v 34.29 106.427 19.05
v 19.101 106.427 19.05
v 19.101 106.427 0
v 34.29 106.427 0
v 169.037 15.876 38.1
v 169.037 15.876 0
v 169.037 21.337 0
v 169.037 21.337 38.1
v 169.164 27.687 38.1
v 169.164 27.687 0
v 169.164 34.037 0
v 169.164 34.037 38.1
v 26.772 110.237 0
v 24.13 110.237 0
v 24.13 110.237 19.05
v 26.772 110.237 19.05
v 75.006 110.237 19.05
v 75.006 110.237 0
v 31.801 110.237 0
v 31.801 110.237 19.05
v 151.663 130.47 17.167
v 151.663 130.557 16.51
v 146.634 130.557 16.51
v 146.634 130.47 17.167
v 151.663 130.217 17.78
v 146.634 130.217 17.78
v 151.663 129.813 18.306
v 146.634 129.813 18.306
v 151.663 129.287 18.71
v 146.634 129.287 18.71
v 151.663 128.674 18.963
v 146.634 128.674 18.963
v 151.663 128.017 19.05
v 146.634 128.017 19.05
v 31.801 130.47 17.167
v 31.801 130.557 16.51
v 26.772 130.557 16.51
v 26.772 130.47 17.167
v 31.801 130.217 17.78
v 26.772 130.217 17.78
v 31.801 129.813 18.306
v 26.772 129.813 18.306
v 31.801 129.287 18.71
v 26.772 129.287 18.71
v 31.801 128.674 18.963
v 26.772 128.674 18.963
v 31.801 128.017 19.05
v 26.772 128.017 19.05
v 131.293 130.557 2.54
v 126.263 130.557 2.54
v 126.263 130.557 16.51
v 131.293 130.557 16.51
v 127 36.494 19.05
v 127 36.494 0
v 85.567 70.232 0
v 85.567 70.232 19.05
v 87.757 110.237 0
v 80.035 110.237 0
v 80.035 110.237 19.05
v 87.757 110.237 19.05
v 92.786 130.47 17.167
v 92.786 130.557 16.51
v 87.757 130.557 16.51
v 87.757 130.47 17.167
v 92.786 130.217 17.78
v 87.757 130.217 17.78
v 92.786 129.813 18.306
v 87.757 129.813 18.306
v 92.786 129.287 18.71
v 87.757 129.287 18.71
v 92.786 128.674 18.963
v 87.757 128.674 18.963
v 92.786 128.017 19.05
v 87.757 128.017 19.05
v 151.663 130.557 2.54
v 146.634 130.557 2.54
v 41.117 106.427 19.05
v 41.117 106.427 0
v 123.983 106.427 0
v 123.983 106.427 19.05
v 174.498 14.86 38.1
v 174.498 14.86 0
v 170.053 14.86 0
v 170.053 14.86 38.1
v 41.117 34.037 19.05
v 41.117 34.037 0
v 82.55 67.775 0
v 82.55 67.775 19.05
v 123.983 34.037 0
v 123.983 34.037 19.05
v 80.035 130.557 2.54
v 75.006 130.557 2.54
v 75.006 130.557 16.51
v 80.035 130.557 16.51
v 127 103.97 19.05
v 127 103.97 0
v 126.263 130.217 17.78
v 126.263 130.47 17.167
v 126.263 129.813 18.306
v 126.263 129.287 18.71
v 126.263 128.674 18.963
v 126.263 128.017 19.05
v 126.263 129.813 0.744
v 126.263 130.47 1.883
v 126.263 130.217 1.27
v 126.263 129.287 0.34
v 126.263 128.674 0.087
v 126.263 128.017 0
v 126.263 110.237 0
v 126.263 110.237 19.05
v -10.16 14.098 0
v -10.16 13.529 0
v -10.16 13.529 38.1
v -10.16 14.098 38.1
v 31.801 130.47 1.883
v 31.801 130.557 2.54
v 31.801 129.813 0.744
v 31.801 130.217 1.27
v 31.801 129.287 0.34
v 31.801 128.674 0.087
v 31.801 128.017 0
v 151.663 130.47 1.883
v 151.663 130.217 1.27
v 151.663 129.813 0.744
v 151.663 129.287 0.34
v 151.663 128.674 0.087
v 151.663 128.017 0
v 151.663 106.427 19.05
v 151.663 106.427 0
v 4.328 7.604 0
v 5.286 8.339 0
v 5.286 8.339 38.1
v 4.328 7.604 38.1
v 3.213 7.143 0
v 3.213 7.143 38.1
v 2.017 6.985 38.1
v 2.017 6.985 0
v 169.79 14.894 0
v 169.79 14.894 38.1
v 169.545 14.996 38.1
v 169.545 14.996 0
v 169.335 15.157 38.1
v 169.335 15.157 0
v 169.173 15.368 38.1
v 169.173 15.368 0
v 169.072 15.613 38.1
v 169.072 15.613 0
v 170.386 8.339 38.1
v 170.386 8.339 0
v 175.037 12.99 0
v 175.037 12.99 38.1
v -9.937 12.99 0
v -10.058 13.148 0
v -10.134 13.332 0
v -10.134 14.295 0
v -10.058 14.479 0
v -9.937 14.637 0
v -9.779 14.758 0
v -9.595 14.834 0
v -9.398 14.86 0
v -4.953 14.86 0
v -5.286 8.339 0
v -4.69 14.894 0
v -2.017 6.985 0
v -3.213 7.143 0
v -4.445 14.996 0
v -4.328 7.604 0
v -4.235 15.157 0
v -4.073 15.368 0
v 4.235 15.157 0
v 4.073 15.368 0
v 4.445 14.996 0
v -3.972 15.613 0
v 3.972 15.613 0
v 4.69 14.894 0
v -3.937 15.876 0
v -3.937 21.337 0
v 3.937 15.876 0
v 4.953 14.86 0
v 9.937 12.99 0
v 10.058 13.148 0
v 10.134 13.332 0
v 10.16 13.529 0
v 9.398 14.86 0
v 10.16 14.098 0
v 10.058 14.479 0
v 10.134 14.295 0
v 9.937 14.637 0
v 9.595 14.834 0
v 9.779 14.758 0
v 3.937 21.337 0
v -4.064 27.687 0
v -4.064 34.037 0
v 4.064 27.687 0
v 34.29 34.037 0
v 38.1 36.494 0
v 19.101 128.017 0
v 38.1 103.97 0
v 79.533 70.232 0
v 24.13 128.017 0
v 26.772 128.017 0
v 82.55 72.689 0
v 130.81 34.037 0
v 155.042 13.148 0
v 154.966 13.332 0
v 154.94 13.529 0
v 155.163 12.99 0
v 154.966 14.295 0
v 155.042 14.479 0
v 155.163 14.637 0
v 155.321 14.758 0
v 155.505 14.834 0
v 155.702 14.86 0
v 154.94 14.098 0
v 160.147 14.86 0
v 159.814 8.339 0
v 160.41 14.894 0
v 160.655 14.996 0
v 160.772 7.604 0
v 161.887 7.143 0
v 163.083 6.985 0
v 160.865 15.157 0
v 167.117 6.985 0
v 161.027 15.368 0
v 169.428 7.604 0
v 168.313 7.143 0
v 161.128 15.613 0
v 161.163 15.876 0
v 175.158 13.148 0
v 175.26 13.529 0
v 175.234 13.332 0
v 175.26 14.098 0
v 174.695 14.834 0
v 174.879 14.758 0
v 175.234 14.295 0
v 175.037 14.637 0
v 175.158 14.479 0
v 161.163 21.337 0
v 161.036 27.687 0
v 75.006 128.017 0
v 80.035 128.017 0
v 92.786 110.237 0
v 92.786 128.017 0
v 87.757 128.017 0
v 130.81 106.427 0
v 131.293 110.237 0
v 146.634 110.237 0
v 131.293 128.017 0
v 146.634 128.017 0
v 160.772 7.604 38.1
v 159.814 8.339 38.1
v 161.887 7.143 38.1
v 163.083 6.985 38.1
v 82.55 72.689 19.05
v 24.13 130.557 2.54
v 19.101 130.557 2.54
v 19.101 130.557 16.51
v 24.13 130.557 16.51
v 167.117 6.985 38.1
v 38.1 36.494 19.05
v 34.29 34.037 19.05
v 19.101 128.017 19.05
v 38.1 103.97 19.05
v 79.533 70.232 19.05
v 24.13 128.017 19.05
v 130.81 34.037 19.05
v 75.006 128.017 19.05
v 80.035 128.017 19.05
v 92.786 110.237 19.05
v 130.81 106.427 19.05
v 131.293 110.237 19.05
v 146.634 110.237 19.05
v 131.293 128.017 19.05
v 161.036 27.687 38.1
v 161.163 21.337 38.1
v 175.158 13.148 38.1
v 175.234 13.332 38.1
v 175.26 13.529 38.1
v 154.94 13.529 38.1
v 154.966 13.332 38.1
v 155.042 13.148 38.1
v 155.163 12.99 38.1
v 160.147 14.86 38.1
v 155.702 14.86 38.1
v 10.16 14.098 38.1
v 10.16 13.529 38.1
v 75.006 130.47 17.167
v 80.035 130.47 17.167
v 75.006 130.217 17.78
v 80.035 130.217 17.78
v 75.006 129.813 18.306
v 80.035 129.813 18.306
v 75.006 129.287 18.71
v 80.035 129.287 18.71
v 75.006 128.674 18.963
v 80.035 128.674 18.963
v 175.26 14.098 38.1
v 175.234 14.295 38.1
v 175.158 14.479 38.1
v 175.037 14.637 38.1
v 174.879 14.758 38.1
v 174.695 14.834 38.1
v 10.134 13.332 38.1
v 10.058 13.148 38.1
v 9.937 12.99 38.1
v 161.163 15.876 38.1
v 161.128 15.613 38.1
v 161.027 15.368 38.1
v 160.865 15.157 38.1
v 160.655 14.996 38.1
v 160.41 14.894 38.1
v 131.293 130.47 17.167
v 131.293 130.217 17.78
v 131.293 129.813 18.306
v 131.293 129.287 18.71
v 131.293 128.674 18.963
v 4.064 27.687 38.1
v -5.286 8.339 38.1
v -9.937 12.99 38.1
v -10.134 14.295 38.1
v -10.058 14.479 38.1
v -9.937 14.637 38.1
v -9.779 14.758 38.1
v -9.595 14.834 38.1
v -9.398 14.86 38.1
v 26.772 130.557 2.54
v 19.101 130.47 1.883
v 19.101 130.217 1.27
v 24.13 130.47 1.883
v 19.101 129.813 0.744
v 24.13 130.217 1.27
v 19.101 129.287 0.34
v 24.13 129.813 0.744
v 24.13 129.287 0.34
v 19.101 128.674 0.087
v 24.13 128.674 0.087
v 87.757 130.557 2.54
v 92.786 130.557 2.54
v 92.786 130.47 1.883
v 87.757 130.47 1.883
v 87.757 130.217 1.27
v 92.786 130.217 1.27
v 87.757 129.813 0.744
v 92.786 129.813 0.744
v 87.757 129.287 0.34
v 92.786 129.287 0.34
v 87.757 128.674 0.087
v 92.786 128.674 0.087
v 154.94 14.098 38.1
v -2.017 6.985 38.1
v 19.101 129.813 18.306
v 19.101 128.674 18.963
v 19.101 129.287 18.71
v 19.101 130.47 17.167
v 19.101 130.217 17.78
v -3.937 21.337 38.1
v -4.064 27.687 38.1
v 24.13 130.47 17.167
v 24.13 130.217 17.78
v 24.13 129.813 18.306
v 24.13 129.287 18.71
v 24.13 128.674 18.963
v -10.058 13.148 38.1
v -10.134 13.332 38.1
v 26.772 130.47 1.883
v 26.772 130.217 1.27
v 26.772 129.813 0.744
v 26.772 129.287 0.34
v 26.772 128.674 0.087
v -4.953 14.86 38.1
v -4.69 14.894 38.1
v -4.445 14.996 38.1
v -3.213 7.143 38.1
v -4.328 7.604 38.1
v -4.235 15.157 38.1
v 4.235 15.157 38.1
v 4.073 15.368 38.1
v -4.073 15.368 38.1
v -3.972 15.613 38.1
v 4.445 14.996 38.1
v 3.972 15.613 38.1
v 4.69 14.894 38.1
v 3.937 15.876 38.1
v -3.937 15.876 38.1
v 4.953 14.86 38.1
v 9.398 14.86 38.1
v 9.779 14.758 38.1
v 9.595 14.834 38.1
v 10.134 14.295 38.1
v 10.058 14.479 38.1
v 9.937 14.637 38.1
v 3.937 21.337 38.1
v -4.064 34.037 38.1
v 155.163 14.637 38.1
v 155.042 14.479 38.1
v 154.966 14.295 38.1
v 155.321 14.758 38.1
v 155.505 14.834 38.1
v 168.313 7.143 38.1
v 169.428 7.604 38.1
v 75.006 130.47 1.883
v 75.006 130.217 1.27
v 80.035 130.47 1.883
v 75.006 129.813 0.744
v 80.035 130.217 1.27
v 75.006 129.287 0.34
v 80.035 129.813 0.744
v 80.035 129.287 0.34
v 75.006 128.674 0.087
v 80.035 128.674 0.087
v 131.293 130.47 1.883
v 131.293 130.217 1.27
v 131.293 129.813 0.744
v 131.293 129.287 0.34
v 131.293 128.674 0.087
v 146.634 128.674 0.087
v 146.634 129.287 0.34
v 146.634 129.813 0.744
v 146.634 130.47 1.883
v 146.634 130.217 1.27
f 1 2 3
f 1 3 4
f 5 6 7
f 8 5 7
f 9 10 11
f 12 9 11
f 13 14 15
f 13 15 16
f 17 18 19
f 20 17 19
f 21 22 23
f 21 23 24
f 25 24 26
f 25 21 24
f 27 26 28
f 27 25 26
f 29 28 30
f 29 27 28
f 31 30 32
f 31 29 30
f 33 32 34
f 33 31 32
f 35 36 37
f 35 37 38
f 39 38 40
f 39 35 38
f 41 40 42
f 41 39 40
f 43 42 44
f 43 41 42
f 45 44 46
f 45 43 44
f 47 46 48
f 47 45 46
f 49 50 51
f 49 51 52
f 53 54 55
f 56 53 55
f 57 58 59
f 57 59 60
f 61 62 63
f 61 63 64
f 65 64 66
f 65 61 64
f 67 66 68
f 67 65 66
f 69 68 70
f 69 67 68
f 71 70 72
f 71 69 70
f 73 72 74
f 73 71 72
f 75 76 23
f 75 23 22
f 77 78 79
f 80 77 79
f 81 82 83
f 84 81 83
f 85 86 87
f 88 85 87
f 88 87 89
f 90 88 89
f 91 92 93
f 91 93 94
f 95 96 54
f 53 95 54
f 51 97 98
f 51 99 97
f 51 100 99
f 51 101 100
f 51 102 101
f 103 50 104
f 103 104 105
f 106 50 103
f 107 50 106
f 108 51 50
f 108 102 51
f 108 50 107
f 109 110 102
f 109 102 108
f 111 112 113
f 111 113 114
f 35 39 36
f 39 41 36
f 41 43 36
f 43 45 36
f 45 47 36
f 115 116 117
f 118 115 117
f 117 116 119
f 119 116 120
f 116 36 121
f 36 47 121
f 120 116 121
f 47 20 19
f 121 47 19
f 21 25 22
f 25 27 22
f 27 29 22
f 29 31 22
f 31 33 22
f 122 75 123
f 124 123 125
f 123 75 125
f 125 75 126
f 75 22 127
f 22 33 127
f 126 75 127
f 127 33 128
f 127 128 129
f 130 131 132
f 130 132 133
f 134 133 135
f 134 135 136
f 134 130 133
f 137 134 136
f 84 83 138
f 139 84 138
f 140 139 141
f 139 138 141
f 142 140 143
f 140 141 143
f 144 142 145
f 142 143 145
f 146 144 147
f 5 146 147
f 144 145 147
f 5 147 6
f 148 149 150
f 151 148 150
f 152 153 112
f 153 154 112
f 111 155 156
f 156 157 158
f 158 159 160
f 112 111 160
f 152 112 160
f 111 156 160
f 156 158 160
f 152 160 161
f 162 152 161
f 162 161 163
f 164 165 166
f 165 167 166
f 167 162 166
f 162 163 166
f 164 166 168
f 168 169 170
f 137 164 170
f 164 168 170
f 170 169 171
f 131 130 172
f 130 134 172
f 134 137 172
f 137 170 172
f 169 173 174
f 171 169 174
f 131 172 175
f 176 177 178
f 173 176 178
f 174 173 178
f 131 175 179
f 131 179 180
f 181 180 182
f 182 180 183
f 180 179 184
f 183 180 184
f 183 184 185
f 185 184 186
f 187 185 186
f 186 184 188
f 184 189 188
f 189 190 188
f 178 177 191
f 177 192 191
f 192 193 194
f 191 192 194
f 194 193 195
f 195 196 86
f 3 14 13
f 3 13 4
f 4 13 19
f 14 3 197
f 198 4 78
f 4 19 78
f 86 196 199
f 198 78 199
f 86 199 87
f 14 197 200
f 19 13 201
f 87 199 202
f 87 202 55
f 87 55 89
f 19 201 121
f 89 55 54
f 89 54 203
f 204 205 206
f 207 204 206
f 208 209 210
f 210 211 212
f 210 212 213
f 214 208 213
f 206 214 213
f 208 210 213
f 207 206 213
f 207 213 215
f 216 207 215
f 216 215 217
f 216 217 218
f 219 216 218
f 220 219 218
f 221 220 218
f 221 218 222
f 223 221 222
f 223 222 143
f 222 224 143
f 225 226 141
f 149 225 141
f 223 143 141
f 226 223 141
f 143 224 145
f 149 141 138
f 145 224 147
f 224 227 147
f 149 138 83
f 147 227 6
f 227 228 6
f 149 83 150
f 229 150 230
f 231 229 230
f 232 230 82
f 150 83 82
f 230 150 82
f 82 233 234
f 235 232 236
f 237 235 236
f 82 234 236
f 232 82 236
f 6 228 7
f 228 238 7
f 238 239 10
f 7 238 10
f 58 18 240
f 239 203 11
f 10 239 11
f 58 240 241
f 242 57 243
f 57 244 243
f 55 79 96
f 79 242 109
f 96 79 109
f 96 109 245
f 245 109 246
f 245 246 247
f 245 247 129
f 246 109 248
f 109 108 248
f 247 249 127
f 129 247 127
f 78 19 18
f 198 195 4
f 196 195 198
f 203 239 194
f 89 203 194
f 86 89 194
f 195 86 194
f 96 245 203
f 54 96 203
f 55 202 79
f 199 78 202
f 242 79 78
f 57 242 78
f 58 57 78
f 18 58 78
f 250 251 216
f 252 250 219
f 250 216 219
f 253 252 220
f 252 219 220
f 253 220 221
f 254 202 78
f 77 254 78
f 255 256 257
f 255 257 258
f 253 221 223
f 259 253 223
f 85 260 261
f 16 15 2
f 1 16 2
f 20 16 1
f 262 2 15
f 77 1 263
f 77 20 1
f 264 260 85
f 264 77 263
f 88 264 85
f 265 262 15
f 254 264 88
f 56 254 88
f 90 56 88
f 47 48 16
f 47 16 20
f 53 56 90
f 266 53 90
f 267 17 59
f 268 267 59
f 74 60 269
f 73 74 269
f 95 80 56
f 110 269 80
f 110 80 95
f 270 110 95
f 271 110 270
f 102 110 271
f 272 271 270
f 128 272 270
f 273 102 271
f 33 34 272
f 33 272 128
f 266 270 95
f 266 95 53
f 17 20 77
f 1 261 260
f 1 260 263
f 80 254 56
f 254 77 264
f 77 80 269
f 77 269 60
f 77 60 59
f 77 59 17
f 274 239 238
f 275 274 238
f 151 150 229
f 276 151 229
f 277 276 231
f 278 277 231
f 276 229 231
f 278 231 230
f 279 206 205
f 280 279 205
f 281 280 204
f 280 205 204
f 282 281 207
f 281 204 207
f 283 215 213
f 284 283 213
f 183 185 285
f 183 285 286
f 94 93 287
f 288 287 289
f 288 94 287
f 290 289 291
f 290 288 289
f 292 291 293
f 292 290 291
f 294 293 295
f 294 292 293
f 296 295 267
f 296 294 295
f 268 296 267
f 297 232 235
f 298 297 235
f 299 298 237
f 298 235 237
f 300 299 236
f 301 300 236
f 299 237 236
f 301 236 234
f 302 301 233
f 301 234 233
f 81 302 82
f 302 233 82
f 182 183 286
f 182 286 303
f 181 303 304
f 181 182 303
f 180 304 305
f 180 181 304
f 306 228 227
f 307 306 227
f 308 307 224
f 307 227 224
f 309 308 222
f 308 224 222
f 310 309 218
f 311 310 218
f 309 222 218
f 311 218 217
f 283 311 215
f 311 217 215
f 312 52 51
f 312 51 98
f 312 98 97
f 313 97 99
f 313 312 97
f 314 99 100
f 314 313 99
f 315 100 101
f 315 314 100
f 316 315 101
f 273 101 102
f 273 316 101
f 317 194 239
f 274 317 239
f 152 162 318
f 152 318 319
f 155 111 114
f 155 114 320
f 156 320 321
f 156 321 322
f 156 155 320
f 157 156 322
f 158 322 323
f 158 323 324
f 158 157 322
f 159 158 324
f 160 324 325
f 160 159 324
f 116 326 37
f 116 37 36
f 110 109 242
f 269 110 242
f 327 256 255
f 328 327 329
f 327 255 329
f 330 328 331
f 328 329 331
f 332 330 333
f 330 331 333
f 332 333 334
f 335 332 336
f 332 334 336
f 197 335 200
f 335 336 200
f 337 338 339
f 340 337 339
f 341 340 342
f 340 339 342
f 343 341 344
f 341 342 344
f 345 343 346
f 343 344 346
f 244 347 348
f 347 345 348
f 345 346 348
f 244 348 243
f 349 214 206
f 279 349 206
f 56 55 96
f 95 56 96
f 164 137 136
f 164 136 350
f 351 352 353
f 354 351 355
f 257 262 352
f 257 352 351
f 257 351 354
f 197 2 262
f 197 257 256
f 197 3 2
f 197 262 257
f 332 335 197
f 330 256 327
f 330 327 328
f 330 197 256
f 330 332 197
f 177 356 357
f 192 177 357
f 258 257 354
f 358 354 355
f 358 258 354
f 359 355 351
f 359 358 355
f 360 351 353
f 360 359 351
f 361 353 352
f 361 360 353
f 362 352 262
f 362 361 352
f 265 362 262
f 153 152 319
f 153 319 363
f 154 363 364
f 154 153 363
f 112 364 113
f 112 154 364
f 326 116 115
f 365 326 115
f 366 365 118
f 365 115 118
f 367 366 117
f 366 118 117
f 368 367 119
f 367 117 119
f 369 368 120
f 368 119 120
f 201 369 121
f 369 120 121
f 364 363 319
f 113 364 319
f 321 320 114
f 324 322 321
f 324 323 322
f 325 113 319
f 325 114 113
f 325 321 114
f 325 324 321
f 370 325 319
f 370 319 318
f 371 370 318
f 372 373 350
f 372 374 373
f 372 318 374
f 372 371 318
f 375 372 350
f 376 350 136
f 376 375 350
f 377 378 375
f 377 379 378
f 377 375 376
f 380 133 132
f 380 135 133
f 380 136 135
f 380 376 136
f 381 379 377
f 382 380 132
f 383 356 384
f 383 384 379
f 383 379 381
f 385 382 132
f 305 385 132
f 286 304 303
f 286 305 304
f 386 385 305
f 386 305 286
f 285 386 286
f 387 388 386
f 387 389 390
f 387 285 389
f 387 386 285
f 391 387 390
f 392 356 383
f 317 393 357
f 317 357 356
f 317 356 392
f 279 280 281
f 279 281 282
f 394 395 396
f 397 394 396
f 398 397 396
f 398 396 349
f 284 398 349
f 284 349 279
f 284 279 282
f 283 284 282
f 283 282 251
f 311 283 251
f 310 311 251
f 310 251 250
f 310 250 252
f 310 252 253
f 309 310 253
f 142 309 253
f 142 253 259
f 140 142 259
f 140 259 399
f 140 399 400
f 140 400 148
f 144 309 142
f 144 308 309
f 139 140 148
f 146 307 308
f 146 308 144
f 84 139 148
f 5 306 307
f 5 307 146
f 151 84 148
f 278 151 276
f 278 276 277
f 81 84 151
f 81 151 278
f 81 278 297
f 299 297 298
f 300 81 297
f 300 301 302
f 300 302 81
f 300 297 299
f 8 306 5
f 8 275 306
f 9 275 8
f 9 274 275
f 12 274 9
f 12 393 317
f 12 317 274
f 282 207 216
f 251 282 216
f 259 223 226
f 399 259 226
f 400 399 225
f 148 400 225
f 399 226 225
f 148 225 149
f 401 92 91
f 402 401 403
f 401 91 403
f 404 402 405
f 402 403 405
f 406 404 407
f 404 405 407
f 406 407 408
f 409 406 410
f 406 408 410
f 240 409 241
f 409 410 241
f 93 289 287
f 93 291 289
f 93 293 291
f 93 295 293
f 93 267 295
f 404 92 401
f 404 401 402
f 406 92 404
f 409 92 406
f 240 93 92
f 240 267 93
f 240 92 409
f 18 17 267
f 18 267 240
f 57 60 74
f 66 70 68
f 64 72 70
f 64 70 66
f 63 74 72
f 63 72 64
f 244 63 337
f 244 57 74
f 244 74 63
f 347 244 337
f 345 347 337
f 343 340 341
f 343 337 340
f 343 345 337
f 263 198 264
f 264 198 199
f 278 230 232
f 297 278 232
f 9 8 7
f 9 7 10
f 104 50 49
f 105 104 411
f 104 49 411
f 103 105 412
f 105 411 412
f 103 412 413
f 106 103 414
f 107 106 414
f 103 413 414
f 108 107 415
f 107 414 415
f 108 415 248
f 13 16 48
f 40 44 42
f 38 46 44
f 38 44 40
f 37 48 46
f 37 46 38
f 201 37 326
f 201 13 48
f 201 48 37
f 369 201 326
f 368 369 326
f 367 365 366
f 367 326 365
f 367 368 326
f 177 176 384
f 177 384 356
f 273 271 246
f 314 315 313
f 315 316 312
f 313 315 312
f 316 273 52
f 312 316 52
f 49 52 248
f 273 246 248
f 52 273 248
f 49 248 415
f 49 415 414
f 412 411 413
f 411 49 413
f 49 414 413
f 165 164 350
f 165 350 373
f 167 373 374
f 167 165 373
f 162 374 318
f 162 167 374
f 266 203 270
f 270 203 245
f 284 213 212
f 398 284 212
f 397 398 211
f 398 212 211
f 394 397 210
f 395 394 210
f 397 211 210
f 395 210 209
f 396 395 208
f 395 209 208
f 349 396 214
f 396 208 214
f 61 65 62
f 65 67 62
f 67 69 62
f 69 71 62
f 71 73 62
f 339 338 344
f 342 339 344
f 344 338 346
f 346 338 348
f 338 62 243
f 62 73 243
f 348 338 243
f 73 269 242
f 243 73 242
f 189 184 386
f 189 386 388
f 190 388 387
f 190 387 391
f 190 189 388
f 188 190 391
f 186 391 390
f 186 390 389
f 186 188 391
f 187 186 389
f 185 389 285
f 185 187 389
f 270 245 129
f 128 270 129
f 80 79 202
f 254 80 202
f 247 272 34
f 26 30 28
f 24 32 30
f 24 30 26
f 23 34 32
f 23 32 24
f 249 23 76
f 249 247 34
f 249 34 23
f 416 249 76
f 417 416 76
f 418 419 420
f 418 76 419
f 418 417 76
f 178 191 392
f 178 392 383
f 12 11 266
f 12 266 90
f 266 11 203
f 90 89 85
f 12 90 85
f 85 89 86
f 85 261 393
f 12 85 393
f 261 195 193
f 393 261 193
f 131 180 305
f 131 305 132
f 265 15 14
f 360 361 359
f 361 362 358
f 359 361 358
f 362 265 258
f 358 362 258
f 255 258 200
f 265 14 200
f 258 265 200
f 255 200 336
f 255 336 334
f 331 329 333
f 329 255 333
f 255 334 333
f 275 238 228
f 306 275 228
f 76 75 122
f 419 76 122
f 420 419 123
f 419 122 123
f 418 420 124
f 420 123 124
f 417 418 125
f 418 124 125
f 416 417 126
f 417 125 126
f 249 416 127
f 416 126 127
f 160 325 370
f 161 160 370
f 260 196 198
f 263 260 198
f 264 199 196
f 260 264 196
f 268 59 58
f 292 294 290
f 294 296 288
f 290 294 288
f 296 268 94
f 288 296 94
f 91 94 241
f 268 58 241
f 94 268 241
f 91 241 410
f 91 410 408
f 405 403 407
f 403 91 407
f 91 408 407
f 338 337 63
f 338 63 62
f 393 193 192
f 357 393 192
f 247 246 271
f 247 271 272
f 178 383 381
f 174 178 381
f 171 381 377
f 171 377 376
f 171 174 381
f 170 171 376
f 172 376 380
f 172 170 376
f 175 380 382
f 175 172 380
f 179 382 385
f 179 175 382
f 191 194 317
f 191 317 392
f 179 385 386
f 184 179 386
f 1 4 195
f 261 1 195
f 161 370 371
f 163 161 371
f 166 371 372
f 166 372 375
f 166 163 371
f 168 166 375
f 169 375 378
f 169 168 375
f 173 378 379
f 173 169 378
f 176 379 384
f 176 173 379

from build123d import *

# Parameters (mm, degrees)
BOSS_EXTRUDE2_DEPTH  = 38.1
BOSS_EXTRUDE6_DEPTH  = 19.05
SKETCH6_W            = 5.08
SKETCH6_H            = 19.05
BOSS_EXTRUDE5_DEPTH  = 20.32
SKETCH10_W           = 23.1648
SKETCH10_H           = 3.81
SKETCH10_W_2         = 17.5006
CUT_EXTRUDE3_DEPTH   = 19.05
FILLET1_R            = 2.54
BOSS_EXTRUDE7_DEPTH  = 19.05
CLEARANCE_START      = -38.1
SKETCH3_W            = 2.6416
SKETCH3_H            = 20.32
SKETCH3_W_2          = 7.7216
SKETCH3_W_3          = 15.3416
CLEARANCE_TRIM_DEPTH = 38.1


with BuildPart() as part:
    # Sketch1 → Boss-Extrude2 (new body)
    with BuildSketch(Plane.XY):
        with BuildLine():
            Line((-2.016886463, 6.858), (2.016886463, 6.858))
            ThreePointArc((2.016886463, 6.858), (3.83455623, 7.219556996), (5.375502252, 8.249184211))
            Line((5.375502252, 8.249184211), (10.026617928, 12.900299887))
            ThreePointArc((10.026617928, 12.900299887), (10.219328904, 13.188712244), (10.287, 13.528917816))
            Line((10.287, 13.528917816), (10.287, 14.097877816))
            ThreePointArc((10.287, 14.097877816), (10.026617928, 14.726495744), (9.398, 14.986877816))
            Line((9.398, 14.986877816), (4.953, 14.986877816))
            ThreePointArc((4.953, 14.986877816), (4.324382072, 15.247259887), (4.064, 15.875877816))
            Line((4.064, 15.875877816), (4.064, 27.686877816))
            Line((4.064, 27.686877816), (161.036, 27.686877816))
            Line((161.036, 27.686877816), (161.036, 15.875877816))
            ThreePointArc((161.036, 15.875877816), (160.775617928, 15.247259887), (160.147, 14.986877816))
            Line((160.147, 14.986877816), (155.702, 14.986877816))
            ThreePointArc((155.702, 14.986877816), (155.073382072, 14.726495744), (154.813, 14.097877816))
            Line((154.813, 14.097877816), (154.813, 13.528917816))
            ThreePointArc((154.813, 13.528917816), (154.880671096, 13.188712244), (155.073382072, 12.900299887))
            Line((155.073382072, 12.900299887), (159.724497748, 8.249184211))
            ThreePointArc((159.724497748, 8.249184211), (161.26544377, 7.219556996), (163.083113537, 6.858))
            Line((163.083113537, 6.858), (167.116886463, 6.858))
            ThreePointArc((167.116886463, 6.858), (168.93455623, 7.219556996), (170.475502252, 8.249184211))
            Line((170.475502252, 8.249184211), (175.126617928, 12.900299887))
            ThreePointArc((175.126617928, 12.900299887), (175.319328904, 13.188712244), (175.387, 13.528917816))
            Line((175.387, 13.528917816), (175.387, 14.097877816))
            ThreePointArc((175.387, 14.097877816), (175.126617928, 14.726495744), (174.498, 14.986877816))
            Line((174.498, 14.986877816), (170.053, 14.986877816))
            ThreePointArc((170.053, 14.986877816), (169.424382072, 15.247259887), (169.164, 15.875877816))
            Line((169.164, 15.875877816), (169.164, 27.686877816))
            Line((169.164, 27.686877816), (169.164, 34.036877816))
            Line((169.164, 34.036877816), (-4.064, 34.036877816))
            Line((-4.064, 34.036877816), (-4.064, 27.686877816))
            Line((-4.064, 27.686877816), (-4.064, 15.875877816))
            ThreePointArc((-4.064, 15.875877816), (-4.324382072, 15.247259887), (-4.953, 14.986877816))
            Line((-4.953, 14.986877816), (-9.398, 14.986877816))
            ThreePointArc((-9.398, 14.986877816), (-10.026617928, 14.726495744), (-10.287, 14.097877816))
            Line((-10.287, 14.097877816), (-10.287, 13.528917816))
            ThreePointArc((-10.287, 13.528917816), (-10.219328904, 13.188712244), (-10.026617928, 12.900299887))
            Line((-10.026617928, 12.900299887), (-5.375502252, 8.249184211))
            ThreePointArc((-5.375502252, 8.249184211), (-3.83455623, 7.219556996), (-2.016886463, 6.858))
        make_face()
    extrude(amount=BOSS_EXTRUDE2_DEPTH)

    # Sketch7 → Boss-Extrude6 (add)
    with BuildSketch(Plane.XY):
        Polygon((130.81, 106.426877816), (169.164, 106.426877816), (169.164, 110.236877816), (-4.064, 110.236877816), (-4.064, 106.426877816), (34.29, 106.426877816), (34.29, 34.036877816), (38.1, 34.036877816), (38.1, 106.426877816), (127, 106.426877816), (127, 34.036877816), (130.81, 34.036877816), align=None)
    extrude(amount=BOSS_EXTRUDE6_DEPTH)

    # Sketch6 → Boss-Extrude5 (add)
    with BuildSketch(Plane(origin=(0, 110.236877816, 0), x_dir=(1, 0, 0), z_dir=(0, 1, 0))):
        with Locations((21.6408, -9.525)):
            Rectangle(SKETCH6_W, SKETCH6_H)
        with Locations((29.2608, -9.525)):
            Rectangle(SKETCH6_W, SKETCH6_H)
        with Locations((77.5462, -9.525)):
            Rectangle(SKETCH6_W, SKETCH6_H)
        with Locations((90.2462, -9.525)):
            Rectangle(SKETCH6_W, SKETCH6_H)
        with Locations((128.8034, -9.525)):
            Rectangle(SKETCH6_W, SKETCH6_H)
        with Locations((149.1234, -9.525)):
            Rectangle(SKETCH6_W, SKETCH6_H)
    extrude(amount=BOSS_EXTRUDE5_DEPTH)

    # Sketch10 → Cut-Extrude3 (cut)
    with BuildSketch(Plane.XY):
        with Locations((7.5184, 108.331877816)):
            Rectangle(SKETCH10_W, SKETCH10_H)
        with Locations((160.4137, 108.331877816)):
            Rectangle(SKETCH10_W_2, SKETCH10_H)
    extrude(amount=CUT_EXTRUDE3_DEPTH, mode=Mode.SUBTRACT)

    # Fillet1
    fillet1_edges = [part.edges().sort_by_distance(p)[0] for p in [
        (21.6408, 130.556877816, 19.05),
        (21.6408, 130.556877816, 0),
        (29.2608, 130.556877816, 0),
        (29.2608, 130.556877816, 19.05),
        (77.5462, 130.556877816, 0),
        (77.5462, 130.556877816, 19.05),
        (90.2462, 130.556877816, 0),
        (90.2462, 130.556877816, 19.05),
        (128.8034, 130.556877816, 0),
        (128.8034, 130.556877816, 19.05),
        (149.1234, 130.556877816, 0),
        (149.1234, 130.556877816, 19.05),
    ]]
    fillet(fillet1_edges, radius=FILLET1_R)

    # Sketch11 → Boss-Extrude7 (add)
    with BuildSketch(Plane.XY):
        Polygon((38.1, 103.970194938), (79.533021028, 70.231877816), (38.1, 36.493560693), (38.1, 34.036877816), (41.116978972, 34.036877816), (82.55, 67.775194938), (123.983021028, 34.036877816), (127, 34.036877816), (127, 36.493560693), (85.566978972, 70.231877816), (127, 103.970194938), (127, 106.426877816), (123.983021028, 106.426877816), (82.55, 72.688560693), (41.116978972, 106.426877816), (38.1, 106.426877816), align=None)
    extrude(amount=BOSS_EXTRUDE7_DEPTH)

    # Sketch3 → Clearance Trim (cut)
    with BuildSketch(Plane.XY.offset(38.1).offset(CLEARANCE_START)):
        with BuildLine():
            Line((4.064, 27.686877816), (3.937, 21.336877816))
            Line((3.937, 21.336877816), (3.937, 15.875877816))
            ThreePointArc((3.937, 15.875877816), (4.23457951, 15.157457326), (4.953, 14.859877816))
            Line((4.953, 14.859877816), (9.398, 14.859877816))
            ThreePointArc((9.398, 14.859877816), (9.936815367, 14.636693183), (10.16, 14.097877816))
            Line((10.16, 14.097877816), (10.16, 13.528917816))
            ThreePointArc((10.16, 13.528917816), (10.101996204, 13.23731304), (9.936815367, 12.990102448))
            Line((9.936815367, 12.990102448), (5.285699691, 8.338986772))
            ThreePointArc((5.285699691, 8.338986772), (3.785955434, 7.336889697), (2.016886463, 6.985))
            Line((2.016886463, 6.985), (-2.016886463, 6.985))
            ThreePointArc((-2.016886463, 6.985), (-3.785955434, 7.336889697), (-5.285699691, 8.338986772))
            Line((-5.285699691, 8.338986772), (-9.936815367, 12.990102448))
            ThreePointArc((-9.936815367, 12.990102448), (-10.101996204, 13.23731304), (-10.16, 13.528917816))
            Line((-10.16, 13.528917816), (-10.16, 14.097877816))
            ThreePointArc((-10.16, 14.097877816), (-9.936815367, 14.636693183), (-9.398, 14.859877816))
            Line((-9.398, 14.859877816), (-4.953, 14.859877816))
            ThreePointArc((-4.953, 14.859877816), (-4.23457951, 15.157457326), (-3.937, 15.875877816))
            Line((-3.937, 15.875877816), (-3.937, 21.336877816))
            Line((-3.937, 21.336877816), (-4.064, 27.686877816))
            Line((-4.064, 27.686877816), (-4.064, 15.875877816))
            ThreePointArc((-4.064, 15.875877816), (-4.324382072, 15.247259887), (-4.953, 14.986877816))
            Line((-4.953, 14.986877816), (-9.398, 14.986877816))
            ThreePointArc((-9.398, 14.986877816), (-10.026617928, 14.726495744), (-10.287, 14.097877816))
            Line((-10.287, 14.097877816), (-10.287, 13.528917816))
            ThreePointArc((-10.287, 13.528917816), (-10.219328904, 13.188712244), (-10.026617928, 12.900299887))
            Line((-10.026617928, 12.900299887), (-5.375502252, 8.249184211))
            ThreePointArc((-5.375502252, 8.249184211), (-3.83455623, 7.219556996), (-2.016886463, 6.858))
            Line((-2.016886463, 6.858), (2.016886463, 6.858))
            ThreePointArc((2.016886463, 6.858), (3.83455623, 7.219556996), (5.375502252, 8.249184211))
            Line((5.375502252, 8.249184211), (10.026617928, 12.900299887))
            ThreePointArc((10.026617928, 12.900299887), (10.219328904, 13.188712244), (10.287, 13.528917816))
            Line((10.287, 13.528917816), (10.287, 14.097877816))
            ThreePointArc((10.287, 14.097877816), (10.026617928, 14.726495744), (9.398, 14.986877816))
            Line((9.398, 14.986877816), (4.953, 14.986877816))
            ThreePointArc((4.953, 14.986877816), (4.324382072, 15.247259887), (4.064, 15.875877816))
            Line((4.064, 15.875877816), (4.064, 27.686877816))
        make_face()
        with BuildLine():
            Line((161.036, 27.686877816), (161.163, 21.336877816))
            Line((161.163, 21.336877816), (161.163, 15.875877816))
            ThreePointArc((161.163, 15.875877816), (160.86542049, 15.157457326), (160.147, 14.859877816))
            Line((160.147, 14.859877816), (155.702, 14.859877816))
            ThreePointArc((155.702, 14.859877816), (155.163184633, 14.636693183), (154.94, 14.097877816))
            Line((154.94, 14.097877816), (154.94, 13.528917816))
            ThreePointArc((154.94, 13.528917816), (154.998003796, 13.23731304), (155.163184633, 12.990102448))
            Line((155.163184633, 12.990102448), (159.814300309, 8.338986772))
            ThreePointArc((159.814300309, 8.338986772), (161.314044566, 7.336889697), (163.083113537, 6.985))
            Line((163.083113537, 6.985), (167.116886463, 6.985))
            ThreePointArc((167.116886463, 6.985), (168.885955434, 7.336889697), (170.385699691, 8.338986772))
            Line((170.385699691, 8.338986772), (175.036815367, 12.990102448))
            ThreePointArc((175.036815367, 12.990102448), (175.201996204, 13.23731304), (175.26, 13.528917816))
            Line((175.26, 13.528917816), (175.26, 14.097877816))
            ThreePointArc((175.26, 14.097877816), (175.036815367, 14.636693183), (174.498, 14.859877816))
            Line((174.498, 14.859877816), (170.053, 14.859877816))
            ThreePointArc((170.053, 14.859877816), (169.33457951, 15.157457326), (169.037, 15.875877816))
            Line((169.037, 15.875877816), (169.037, 21.336877816))
            Line((169.037, 21.336877816), (169.164, 27.686877816))
            Line((169.164, 27.686877816), (169.164, 15.875877816))
            ThreePointArc((169.164, 15.875877816), (169.424382072, 15.247259887), (170.053, 14.986877816))
            Line((170.053, 14.986877816), (174.498, 14.986877816))
            ThreePointArc((174.498, 14.986877816), (175.126617928, 14.726495744), (175.387, 14.097877816))
            Line((175.387, 14.097877816), (175.387, 13.528917816))
            ThreePointArc((175.387, 13.528917816), (175.319328904, 13.188712244), (175.126617928, 12.900299887))
            Line((175.126617928, 12.900299887), (170.475502252, 8.249184211))
            ThreePointArc((170.475502252, 8.249184211), (168.93455623, 7.219556996), (167.116886463, 6.858))
            Line((167.116886463, 6.858), (163.083113537, 6.858))
            ThreePointArc((163.083113537, 6.858), (161.26544377, 7.219556996), (159.724497748, 8.249184211))
            Line((159.724497748, 8.249184211), (155.073382072, 12.900299887))
            ThreePointArc((155.073382072, 12.900299887), (154.880671096, 13.188712244), (154.813, 13.528917816))
            Line((154.813, 13.528917816), (154.813, 14.097877816))
            ThreePointArc((154.813, 14.097877816), (155.073382072, 14.726495744), (155.702, 14.986877816))
            Line((155.702, 14.986877816), (160.147, 14.986877816))
            ThreePointArc((160.147, 14.986877816), (160.775617928, 15.247259887), (161.036, 15.875877816))
            Line((161.036, 15.875877816), (161.036, 27.686877816))
        make_face()
        with Locations((25.4508, 120.396877816)):
            Rectangle(SKETCH3_W, SKETCH3_H)
        with Locations((83.8962, 120.396877816)):
            Rectangle(SKETCH3_W_2, SKETCH3_H)
        with Locations((138.9634, 120.396877816)):
            Rectangle(SKETCH3_W_3, SKETCH3_H)
    extrude(amount=CLEARANCE_TRIM_DEPTH, mode=Mode.SUBTRACT)


solid = part.part
